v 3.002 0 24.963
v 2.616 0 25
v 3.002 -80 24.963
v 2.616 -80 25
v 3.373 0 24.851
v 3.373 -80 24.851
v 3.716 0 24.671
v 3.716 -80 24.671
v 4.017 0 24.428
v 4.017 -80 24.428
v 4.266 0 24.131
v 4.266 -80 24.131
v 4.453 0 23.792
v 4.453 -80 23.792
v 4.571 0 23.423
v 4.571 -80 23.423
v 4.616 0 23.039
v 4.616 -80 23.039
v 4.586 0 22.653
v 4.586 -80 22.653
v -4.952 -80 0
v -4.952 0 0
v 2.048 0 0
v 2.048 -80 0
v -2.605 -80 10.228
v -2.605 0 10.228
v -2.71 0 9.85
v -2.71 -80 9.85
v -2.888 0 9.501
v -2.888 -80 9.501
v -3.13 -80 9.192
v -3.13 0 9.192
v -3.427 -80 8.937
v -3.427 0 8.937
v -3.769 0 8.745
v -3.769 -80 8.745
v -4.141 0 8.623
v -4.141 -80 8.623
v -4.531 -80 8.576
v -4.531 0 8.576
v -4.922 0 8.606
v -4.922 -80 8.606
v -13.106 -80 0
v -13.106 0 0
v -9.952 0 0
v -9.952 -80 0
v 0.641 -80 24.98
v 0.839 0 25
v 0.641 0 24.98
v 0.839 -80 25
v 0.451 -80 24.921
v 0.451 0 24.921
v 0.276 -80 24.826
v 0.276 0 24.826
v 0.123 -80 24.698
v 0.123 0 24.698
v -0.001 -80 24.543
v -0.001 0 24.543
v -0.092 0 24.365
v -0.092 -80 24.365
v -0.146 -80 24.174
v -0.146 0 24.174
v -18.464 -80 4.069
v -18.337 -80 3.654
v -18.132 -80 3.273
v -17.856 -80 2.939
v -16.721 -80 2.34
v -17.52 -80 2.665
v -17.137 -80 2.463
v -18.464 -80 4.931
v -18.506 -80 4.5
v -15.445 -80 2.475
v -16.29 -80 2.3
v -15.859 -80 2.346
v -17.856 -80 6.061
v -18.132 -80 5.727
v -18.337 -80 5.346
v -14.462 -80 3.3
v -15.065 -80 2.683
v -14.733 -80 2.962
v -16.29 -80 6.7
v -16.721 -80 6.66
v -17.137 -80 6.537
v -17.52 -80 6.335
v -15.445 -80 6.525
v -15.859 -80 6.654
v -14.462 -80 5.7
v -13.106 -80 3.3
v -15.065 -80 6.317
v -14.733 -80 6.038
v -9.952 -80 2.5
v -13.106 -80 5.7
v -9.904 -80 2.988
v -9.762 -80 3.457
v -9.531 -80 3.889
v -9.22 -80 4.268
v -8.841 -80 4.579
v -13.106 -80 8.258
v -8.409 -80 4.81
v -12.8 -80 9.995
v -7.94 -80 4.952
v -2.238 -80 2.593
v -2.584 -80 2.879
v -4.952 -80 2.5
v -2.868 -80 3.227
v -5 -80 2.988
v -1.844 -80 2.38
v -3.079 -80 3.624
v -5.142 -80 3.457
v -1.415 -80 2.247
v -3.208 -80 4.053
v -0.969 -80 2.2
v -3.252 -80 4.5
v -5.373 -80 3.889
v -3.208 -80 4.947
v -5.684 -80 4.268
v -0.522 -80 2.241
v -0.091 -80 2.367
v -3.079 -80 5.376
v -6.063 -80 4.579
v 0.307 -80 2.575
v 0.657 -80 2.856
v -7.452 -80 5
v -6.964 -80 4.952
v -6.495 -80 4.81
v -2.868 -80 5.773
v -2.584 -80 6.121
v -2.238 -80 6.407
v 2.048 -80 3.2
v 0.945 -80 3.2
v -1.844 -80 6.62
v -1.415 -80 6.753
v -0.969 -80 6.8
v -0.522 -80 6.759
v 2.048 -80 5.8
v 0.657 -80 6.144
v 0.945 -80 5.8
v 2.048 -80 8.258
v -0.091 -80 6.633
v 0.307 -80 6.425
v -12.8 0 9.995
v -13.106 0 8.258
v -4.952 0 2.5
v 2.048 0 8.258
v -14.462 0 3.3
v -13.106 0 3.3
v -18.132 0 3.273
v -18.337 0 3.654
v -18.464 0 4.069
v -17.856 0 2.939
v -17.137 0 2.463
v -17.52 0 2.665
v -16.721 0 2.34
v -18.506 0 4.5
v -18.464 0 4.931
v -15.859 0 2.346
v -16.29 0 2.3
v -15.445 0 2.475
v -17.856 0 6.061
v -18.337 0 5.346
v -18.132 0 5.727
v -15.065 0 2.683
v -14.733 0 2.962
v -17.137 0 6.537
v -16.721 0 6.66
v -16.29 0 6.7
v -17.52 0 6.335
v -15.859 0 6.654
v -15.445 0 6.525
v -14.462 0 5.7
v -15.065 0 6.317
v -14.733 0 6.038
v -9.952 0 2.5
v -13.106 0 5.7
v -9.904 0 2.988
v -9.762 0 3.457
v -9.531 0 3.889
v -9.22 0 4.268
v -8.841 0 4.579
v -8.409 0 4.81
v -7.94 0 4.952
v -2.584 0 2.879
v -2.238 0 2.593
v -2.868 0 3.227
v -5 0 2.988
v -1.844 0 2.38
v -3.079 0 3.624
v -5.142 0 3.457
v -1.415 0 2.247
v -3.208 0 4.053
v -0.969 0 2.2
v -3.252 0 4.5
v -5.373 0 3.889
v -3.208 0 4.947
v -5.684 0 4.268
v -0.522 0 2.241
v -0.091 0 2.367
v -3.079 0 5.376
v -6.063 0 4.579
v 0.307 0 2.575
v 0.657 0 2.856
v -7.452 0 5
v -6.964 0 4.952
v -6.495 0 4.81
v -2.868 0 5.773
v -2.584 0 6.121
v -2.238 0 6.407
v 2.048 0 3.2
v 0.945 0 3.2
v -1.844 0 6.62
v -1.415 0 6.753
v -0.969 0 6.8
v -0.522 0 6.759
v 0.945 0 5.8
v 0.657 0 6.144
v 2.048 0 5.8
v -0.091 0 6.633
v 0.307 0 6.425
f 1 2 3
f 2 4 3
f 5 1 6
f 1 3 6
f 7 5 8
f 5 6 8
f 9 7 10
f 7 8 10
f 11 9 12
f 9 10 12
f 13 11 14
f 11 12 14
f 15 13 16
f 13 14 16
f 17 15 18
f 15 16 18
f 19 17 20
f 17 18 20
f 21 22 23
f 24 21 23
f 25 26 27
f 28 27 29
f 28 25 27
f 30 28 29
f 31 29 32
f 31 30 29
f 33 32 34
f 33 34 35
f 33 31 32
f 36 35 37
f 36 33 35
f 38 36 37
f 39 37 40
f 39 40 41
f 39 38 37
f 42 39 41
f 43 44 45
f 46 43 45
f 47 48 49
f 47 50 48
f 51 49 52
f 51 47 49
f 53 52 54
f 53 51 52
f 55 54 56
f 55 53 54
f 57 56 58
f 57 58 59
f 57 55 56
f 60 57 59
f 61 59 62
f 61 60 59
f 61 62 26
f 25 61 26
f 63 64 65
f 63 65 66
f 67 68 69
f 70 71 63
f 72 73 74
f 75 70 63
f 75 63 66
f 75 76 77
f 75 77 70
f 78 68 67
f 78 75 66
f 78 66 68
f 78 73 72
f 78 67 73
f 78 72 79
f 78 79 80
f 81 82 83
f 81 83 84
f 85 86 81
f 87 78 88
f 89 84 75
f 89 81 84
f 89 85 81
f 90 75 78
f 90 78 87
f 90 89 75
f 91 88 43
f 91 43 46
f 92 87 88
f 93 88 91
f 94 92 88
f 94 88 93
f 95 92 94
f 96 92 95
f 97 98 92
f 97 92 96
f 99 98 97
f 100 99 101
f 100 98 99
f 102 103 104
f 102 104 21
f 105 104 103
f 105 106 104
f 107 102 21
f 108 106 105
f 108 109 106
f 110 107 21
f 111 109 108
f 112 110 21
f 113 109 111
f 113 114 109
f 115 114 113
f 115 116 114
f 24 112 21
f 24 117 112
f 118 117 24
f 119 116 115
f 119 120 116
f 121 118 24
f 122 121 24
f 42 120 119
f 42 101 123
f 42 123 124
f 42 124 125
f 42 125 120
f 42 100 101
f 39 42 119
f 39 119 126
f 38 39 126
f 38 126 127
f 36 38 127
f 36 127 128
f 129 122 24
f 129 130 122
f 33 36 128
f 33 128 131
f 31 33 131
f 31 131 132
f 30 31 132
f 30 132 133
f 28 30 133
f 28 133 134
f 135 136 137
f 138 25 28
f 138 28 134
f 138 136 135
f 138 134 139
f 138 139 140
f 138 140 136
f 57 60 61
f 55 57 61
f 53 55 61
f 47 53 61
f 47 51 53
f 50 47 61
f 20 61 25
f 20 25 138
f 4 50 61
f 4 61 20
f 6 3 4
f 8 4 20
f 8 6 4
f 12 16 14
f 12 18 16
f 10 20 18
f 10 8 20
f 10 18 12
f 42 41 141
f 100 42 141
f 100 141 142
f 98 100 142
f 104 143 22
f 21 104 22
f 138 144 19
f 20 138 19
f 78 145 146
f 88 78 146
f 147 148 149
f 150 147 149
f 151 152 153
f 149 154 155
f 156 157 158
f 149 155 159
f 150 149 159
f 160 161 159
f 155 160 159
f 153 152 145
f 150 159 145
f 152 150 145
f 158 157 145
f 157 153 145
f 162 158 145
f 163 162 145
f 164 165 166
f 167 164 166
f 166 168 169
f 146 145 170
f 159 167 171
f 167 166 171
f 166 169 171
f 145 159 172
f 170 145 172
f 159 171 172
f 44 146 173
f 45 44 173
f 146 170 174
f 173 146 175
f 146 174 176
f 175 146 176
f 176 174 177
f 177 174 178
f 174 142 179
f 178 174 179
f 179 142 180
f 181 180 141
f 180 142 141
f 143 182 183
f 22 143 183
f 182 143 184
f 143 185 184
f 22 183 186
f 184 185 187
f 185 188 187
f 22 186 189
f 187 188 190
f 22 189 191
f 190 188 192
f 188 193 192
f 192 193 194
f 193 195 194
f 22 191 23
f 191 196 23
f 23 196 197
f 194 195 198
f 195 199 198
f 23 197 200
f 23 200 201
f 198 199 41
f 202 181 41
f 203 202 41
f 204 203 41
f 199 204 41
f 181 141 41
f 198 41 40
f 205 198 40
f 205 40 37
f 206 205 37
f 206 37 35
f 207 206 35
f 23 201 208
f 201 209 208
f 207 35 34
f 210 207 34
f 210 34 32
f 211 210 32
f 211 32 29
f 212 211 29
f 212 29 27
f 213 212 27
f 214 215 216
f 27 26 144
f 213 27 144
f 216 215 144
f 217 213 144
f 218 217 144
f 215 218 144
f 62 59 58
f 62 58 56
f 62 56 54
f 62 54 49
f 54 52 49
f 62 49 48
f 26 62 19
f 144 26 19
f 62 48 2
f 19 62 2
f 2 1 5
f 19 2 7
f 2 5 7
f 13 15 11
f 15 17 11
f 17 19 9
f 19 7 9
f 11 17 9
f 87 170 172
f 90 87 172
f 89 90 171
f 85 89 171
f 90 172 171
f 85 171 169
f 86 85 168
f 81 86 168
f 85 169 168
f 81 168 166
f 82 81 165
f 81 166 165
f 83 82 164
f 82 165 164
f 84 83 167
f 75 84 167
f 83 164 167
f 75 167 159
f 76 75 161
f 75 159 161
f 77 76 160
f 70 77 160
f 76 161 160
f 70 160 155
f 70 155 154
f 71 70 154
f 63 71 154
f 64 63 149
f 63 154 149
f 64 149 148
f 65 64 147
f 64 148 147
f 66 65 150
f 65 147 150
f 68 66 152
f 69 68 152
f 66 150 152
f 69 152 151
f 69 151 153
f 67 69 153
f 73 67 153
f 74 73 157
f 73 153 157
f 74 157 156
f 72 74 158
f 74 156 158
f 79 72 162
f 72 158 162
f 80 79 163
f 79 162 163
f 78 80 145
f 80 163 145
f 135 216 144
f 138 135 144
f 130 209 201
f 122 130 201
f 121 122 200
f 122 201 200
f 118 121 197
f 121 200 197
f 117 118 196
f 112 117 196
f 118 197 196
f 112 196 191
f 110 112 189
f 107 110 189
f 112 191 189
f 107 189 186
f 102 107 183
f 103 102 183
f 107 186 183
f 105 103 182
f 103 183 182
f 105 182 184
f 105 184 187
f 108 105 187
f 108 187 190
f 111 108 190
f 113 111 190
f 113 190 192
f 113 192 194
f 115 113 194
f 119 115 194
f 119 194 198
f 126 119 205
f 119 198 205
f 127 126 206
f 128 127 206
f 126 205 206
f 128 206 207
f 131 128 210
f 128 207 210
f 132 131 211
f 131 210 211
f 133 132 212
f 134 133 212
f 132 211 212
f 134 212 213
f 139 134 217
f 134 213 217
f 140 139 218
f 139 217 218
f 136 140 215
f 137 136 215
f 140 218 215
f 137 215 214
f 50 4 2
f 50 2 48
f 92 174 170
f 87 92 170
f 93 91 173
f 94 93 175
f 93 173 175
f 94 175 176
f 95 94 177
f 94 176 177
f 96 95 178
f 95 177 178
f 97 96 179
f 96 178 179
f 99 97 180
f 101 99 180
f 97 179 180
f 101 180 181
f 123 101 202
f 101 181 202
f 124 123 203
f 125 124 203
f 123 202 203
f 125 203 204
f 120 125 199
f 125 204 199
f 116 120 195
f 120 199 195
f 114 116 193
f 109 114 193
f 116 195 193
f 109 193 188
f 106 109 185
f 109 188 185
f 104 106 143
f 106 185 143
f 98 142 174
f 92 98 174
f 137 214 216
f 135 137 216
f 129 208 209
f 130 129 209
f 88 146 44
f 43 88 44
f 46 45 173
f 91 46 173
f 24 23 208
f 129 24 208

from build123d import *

# Parameters (mm, degrees)
F1_DEPTH = 80
F2_R     = 2
F3_R     = 1


with BuildPart() as f1:
    # F0 (on Front) → F1 (new body)
    with BuildSketch(Plane.XZ):
        with BuildLine():
            Line((5, 25), (0, 25))
            Line((0, 25), (-2.952019, 8.258268))
            Line((-2.952019, 8.258268), (-12.800097, 9.99475))
            Line((-12.800097, 9.99475), (-13.106285, 8.258268))
            Line((-13.106285, 8.258268), (-13.106285, 5.7))
            Line((-13.106285, 5.7), (-14.462376, 5.7))
            ThreePointArc((-14.462376, 5.7), (-18.506285, 4.5), (-14.462376, 3.3))
            Line((-14.462376, 3.3), (-13.106285, 3.3))
            Line((-13.106285, 3.3), (-13.106285, 0))
            Line((-13.106285, 0), (-9.952019, 0))
            Line((-9.952019, 0), (-9.952019, 2.5))
            ThreePointArc((-9.952019, 2.5), (-7.452019, 5), (-4.952019, 2.5))
            Line((-4.952019, 2.5), (-4.952019, 0))
            Line((-4.952019, 0), (2.047981, 0))
            Line((2.047981, 0), (2.047981, 3.2))
            Line((2.047981, 3.2), (0.945348, 3.2))
            ThreePointArc((0.945348, 3.2), (-3.252019, 4.5), (0.945348, 5.8))
            Line((0.945348, 5.8), (2.047981, 5.8))
            Line((2.047981, 5.8), (2.047981, 8.258268))
            Line((2.047981, 8.258268), (5, 25))
        make_face()
    extrude(amount=F1_DEPTH)

    # F2
    f2_edges = [f1.edges().sort_by_distance(p)[0] for p in [
        (5, -40, 25),
        (-2.952019, -40, 8.258268),
    ]]
    fillet(f2_edges, radius=F2_R)

    # F3
    f3_edges = [f1.edges().sort_by_distance(p)[0] for p in [
        (0, -40, 25),
    ]]
    fillet(f3_edges, radius=F3_R)


solid = f1.part
